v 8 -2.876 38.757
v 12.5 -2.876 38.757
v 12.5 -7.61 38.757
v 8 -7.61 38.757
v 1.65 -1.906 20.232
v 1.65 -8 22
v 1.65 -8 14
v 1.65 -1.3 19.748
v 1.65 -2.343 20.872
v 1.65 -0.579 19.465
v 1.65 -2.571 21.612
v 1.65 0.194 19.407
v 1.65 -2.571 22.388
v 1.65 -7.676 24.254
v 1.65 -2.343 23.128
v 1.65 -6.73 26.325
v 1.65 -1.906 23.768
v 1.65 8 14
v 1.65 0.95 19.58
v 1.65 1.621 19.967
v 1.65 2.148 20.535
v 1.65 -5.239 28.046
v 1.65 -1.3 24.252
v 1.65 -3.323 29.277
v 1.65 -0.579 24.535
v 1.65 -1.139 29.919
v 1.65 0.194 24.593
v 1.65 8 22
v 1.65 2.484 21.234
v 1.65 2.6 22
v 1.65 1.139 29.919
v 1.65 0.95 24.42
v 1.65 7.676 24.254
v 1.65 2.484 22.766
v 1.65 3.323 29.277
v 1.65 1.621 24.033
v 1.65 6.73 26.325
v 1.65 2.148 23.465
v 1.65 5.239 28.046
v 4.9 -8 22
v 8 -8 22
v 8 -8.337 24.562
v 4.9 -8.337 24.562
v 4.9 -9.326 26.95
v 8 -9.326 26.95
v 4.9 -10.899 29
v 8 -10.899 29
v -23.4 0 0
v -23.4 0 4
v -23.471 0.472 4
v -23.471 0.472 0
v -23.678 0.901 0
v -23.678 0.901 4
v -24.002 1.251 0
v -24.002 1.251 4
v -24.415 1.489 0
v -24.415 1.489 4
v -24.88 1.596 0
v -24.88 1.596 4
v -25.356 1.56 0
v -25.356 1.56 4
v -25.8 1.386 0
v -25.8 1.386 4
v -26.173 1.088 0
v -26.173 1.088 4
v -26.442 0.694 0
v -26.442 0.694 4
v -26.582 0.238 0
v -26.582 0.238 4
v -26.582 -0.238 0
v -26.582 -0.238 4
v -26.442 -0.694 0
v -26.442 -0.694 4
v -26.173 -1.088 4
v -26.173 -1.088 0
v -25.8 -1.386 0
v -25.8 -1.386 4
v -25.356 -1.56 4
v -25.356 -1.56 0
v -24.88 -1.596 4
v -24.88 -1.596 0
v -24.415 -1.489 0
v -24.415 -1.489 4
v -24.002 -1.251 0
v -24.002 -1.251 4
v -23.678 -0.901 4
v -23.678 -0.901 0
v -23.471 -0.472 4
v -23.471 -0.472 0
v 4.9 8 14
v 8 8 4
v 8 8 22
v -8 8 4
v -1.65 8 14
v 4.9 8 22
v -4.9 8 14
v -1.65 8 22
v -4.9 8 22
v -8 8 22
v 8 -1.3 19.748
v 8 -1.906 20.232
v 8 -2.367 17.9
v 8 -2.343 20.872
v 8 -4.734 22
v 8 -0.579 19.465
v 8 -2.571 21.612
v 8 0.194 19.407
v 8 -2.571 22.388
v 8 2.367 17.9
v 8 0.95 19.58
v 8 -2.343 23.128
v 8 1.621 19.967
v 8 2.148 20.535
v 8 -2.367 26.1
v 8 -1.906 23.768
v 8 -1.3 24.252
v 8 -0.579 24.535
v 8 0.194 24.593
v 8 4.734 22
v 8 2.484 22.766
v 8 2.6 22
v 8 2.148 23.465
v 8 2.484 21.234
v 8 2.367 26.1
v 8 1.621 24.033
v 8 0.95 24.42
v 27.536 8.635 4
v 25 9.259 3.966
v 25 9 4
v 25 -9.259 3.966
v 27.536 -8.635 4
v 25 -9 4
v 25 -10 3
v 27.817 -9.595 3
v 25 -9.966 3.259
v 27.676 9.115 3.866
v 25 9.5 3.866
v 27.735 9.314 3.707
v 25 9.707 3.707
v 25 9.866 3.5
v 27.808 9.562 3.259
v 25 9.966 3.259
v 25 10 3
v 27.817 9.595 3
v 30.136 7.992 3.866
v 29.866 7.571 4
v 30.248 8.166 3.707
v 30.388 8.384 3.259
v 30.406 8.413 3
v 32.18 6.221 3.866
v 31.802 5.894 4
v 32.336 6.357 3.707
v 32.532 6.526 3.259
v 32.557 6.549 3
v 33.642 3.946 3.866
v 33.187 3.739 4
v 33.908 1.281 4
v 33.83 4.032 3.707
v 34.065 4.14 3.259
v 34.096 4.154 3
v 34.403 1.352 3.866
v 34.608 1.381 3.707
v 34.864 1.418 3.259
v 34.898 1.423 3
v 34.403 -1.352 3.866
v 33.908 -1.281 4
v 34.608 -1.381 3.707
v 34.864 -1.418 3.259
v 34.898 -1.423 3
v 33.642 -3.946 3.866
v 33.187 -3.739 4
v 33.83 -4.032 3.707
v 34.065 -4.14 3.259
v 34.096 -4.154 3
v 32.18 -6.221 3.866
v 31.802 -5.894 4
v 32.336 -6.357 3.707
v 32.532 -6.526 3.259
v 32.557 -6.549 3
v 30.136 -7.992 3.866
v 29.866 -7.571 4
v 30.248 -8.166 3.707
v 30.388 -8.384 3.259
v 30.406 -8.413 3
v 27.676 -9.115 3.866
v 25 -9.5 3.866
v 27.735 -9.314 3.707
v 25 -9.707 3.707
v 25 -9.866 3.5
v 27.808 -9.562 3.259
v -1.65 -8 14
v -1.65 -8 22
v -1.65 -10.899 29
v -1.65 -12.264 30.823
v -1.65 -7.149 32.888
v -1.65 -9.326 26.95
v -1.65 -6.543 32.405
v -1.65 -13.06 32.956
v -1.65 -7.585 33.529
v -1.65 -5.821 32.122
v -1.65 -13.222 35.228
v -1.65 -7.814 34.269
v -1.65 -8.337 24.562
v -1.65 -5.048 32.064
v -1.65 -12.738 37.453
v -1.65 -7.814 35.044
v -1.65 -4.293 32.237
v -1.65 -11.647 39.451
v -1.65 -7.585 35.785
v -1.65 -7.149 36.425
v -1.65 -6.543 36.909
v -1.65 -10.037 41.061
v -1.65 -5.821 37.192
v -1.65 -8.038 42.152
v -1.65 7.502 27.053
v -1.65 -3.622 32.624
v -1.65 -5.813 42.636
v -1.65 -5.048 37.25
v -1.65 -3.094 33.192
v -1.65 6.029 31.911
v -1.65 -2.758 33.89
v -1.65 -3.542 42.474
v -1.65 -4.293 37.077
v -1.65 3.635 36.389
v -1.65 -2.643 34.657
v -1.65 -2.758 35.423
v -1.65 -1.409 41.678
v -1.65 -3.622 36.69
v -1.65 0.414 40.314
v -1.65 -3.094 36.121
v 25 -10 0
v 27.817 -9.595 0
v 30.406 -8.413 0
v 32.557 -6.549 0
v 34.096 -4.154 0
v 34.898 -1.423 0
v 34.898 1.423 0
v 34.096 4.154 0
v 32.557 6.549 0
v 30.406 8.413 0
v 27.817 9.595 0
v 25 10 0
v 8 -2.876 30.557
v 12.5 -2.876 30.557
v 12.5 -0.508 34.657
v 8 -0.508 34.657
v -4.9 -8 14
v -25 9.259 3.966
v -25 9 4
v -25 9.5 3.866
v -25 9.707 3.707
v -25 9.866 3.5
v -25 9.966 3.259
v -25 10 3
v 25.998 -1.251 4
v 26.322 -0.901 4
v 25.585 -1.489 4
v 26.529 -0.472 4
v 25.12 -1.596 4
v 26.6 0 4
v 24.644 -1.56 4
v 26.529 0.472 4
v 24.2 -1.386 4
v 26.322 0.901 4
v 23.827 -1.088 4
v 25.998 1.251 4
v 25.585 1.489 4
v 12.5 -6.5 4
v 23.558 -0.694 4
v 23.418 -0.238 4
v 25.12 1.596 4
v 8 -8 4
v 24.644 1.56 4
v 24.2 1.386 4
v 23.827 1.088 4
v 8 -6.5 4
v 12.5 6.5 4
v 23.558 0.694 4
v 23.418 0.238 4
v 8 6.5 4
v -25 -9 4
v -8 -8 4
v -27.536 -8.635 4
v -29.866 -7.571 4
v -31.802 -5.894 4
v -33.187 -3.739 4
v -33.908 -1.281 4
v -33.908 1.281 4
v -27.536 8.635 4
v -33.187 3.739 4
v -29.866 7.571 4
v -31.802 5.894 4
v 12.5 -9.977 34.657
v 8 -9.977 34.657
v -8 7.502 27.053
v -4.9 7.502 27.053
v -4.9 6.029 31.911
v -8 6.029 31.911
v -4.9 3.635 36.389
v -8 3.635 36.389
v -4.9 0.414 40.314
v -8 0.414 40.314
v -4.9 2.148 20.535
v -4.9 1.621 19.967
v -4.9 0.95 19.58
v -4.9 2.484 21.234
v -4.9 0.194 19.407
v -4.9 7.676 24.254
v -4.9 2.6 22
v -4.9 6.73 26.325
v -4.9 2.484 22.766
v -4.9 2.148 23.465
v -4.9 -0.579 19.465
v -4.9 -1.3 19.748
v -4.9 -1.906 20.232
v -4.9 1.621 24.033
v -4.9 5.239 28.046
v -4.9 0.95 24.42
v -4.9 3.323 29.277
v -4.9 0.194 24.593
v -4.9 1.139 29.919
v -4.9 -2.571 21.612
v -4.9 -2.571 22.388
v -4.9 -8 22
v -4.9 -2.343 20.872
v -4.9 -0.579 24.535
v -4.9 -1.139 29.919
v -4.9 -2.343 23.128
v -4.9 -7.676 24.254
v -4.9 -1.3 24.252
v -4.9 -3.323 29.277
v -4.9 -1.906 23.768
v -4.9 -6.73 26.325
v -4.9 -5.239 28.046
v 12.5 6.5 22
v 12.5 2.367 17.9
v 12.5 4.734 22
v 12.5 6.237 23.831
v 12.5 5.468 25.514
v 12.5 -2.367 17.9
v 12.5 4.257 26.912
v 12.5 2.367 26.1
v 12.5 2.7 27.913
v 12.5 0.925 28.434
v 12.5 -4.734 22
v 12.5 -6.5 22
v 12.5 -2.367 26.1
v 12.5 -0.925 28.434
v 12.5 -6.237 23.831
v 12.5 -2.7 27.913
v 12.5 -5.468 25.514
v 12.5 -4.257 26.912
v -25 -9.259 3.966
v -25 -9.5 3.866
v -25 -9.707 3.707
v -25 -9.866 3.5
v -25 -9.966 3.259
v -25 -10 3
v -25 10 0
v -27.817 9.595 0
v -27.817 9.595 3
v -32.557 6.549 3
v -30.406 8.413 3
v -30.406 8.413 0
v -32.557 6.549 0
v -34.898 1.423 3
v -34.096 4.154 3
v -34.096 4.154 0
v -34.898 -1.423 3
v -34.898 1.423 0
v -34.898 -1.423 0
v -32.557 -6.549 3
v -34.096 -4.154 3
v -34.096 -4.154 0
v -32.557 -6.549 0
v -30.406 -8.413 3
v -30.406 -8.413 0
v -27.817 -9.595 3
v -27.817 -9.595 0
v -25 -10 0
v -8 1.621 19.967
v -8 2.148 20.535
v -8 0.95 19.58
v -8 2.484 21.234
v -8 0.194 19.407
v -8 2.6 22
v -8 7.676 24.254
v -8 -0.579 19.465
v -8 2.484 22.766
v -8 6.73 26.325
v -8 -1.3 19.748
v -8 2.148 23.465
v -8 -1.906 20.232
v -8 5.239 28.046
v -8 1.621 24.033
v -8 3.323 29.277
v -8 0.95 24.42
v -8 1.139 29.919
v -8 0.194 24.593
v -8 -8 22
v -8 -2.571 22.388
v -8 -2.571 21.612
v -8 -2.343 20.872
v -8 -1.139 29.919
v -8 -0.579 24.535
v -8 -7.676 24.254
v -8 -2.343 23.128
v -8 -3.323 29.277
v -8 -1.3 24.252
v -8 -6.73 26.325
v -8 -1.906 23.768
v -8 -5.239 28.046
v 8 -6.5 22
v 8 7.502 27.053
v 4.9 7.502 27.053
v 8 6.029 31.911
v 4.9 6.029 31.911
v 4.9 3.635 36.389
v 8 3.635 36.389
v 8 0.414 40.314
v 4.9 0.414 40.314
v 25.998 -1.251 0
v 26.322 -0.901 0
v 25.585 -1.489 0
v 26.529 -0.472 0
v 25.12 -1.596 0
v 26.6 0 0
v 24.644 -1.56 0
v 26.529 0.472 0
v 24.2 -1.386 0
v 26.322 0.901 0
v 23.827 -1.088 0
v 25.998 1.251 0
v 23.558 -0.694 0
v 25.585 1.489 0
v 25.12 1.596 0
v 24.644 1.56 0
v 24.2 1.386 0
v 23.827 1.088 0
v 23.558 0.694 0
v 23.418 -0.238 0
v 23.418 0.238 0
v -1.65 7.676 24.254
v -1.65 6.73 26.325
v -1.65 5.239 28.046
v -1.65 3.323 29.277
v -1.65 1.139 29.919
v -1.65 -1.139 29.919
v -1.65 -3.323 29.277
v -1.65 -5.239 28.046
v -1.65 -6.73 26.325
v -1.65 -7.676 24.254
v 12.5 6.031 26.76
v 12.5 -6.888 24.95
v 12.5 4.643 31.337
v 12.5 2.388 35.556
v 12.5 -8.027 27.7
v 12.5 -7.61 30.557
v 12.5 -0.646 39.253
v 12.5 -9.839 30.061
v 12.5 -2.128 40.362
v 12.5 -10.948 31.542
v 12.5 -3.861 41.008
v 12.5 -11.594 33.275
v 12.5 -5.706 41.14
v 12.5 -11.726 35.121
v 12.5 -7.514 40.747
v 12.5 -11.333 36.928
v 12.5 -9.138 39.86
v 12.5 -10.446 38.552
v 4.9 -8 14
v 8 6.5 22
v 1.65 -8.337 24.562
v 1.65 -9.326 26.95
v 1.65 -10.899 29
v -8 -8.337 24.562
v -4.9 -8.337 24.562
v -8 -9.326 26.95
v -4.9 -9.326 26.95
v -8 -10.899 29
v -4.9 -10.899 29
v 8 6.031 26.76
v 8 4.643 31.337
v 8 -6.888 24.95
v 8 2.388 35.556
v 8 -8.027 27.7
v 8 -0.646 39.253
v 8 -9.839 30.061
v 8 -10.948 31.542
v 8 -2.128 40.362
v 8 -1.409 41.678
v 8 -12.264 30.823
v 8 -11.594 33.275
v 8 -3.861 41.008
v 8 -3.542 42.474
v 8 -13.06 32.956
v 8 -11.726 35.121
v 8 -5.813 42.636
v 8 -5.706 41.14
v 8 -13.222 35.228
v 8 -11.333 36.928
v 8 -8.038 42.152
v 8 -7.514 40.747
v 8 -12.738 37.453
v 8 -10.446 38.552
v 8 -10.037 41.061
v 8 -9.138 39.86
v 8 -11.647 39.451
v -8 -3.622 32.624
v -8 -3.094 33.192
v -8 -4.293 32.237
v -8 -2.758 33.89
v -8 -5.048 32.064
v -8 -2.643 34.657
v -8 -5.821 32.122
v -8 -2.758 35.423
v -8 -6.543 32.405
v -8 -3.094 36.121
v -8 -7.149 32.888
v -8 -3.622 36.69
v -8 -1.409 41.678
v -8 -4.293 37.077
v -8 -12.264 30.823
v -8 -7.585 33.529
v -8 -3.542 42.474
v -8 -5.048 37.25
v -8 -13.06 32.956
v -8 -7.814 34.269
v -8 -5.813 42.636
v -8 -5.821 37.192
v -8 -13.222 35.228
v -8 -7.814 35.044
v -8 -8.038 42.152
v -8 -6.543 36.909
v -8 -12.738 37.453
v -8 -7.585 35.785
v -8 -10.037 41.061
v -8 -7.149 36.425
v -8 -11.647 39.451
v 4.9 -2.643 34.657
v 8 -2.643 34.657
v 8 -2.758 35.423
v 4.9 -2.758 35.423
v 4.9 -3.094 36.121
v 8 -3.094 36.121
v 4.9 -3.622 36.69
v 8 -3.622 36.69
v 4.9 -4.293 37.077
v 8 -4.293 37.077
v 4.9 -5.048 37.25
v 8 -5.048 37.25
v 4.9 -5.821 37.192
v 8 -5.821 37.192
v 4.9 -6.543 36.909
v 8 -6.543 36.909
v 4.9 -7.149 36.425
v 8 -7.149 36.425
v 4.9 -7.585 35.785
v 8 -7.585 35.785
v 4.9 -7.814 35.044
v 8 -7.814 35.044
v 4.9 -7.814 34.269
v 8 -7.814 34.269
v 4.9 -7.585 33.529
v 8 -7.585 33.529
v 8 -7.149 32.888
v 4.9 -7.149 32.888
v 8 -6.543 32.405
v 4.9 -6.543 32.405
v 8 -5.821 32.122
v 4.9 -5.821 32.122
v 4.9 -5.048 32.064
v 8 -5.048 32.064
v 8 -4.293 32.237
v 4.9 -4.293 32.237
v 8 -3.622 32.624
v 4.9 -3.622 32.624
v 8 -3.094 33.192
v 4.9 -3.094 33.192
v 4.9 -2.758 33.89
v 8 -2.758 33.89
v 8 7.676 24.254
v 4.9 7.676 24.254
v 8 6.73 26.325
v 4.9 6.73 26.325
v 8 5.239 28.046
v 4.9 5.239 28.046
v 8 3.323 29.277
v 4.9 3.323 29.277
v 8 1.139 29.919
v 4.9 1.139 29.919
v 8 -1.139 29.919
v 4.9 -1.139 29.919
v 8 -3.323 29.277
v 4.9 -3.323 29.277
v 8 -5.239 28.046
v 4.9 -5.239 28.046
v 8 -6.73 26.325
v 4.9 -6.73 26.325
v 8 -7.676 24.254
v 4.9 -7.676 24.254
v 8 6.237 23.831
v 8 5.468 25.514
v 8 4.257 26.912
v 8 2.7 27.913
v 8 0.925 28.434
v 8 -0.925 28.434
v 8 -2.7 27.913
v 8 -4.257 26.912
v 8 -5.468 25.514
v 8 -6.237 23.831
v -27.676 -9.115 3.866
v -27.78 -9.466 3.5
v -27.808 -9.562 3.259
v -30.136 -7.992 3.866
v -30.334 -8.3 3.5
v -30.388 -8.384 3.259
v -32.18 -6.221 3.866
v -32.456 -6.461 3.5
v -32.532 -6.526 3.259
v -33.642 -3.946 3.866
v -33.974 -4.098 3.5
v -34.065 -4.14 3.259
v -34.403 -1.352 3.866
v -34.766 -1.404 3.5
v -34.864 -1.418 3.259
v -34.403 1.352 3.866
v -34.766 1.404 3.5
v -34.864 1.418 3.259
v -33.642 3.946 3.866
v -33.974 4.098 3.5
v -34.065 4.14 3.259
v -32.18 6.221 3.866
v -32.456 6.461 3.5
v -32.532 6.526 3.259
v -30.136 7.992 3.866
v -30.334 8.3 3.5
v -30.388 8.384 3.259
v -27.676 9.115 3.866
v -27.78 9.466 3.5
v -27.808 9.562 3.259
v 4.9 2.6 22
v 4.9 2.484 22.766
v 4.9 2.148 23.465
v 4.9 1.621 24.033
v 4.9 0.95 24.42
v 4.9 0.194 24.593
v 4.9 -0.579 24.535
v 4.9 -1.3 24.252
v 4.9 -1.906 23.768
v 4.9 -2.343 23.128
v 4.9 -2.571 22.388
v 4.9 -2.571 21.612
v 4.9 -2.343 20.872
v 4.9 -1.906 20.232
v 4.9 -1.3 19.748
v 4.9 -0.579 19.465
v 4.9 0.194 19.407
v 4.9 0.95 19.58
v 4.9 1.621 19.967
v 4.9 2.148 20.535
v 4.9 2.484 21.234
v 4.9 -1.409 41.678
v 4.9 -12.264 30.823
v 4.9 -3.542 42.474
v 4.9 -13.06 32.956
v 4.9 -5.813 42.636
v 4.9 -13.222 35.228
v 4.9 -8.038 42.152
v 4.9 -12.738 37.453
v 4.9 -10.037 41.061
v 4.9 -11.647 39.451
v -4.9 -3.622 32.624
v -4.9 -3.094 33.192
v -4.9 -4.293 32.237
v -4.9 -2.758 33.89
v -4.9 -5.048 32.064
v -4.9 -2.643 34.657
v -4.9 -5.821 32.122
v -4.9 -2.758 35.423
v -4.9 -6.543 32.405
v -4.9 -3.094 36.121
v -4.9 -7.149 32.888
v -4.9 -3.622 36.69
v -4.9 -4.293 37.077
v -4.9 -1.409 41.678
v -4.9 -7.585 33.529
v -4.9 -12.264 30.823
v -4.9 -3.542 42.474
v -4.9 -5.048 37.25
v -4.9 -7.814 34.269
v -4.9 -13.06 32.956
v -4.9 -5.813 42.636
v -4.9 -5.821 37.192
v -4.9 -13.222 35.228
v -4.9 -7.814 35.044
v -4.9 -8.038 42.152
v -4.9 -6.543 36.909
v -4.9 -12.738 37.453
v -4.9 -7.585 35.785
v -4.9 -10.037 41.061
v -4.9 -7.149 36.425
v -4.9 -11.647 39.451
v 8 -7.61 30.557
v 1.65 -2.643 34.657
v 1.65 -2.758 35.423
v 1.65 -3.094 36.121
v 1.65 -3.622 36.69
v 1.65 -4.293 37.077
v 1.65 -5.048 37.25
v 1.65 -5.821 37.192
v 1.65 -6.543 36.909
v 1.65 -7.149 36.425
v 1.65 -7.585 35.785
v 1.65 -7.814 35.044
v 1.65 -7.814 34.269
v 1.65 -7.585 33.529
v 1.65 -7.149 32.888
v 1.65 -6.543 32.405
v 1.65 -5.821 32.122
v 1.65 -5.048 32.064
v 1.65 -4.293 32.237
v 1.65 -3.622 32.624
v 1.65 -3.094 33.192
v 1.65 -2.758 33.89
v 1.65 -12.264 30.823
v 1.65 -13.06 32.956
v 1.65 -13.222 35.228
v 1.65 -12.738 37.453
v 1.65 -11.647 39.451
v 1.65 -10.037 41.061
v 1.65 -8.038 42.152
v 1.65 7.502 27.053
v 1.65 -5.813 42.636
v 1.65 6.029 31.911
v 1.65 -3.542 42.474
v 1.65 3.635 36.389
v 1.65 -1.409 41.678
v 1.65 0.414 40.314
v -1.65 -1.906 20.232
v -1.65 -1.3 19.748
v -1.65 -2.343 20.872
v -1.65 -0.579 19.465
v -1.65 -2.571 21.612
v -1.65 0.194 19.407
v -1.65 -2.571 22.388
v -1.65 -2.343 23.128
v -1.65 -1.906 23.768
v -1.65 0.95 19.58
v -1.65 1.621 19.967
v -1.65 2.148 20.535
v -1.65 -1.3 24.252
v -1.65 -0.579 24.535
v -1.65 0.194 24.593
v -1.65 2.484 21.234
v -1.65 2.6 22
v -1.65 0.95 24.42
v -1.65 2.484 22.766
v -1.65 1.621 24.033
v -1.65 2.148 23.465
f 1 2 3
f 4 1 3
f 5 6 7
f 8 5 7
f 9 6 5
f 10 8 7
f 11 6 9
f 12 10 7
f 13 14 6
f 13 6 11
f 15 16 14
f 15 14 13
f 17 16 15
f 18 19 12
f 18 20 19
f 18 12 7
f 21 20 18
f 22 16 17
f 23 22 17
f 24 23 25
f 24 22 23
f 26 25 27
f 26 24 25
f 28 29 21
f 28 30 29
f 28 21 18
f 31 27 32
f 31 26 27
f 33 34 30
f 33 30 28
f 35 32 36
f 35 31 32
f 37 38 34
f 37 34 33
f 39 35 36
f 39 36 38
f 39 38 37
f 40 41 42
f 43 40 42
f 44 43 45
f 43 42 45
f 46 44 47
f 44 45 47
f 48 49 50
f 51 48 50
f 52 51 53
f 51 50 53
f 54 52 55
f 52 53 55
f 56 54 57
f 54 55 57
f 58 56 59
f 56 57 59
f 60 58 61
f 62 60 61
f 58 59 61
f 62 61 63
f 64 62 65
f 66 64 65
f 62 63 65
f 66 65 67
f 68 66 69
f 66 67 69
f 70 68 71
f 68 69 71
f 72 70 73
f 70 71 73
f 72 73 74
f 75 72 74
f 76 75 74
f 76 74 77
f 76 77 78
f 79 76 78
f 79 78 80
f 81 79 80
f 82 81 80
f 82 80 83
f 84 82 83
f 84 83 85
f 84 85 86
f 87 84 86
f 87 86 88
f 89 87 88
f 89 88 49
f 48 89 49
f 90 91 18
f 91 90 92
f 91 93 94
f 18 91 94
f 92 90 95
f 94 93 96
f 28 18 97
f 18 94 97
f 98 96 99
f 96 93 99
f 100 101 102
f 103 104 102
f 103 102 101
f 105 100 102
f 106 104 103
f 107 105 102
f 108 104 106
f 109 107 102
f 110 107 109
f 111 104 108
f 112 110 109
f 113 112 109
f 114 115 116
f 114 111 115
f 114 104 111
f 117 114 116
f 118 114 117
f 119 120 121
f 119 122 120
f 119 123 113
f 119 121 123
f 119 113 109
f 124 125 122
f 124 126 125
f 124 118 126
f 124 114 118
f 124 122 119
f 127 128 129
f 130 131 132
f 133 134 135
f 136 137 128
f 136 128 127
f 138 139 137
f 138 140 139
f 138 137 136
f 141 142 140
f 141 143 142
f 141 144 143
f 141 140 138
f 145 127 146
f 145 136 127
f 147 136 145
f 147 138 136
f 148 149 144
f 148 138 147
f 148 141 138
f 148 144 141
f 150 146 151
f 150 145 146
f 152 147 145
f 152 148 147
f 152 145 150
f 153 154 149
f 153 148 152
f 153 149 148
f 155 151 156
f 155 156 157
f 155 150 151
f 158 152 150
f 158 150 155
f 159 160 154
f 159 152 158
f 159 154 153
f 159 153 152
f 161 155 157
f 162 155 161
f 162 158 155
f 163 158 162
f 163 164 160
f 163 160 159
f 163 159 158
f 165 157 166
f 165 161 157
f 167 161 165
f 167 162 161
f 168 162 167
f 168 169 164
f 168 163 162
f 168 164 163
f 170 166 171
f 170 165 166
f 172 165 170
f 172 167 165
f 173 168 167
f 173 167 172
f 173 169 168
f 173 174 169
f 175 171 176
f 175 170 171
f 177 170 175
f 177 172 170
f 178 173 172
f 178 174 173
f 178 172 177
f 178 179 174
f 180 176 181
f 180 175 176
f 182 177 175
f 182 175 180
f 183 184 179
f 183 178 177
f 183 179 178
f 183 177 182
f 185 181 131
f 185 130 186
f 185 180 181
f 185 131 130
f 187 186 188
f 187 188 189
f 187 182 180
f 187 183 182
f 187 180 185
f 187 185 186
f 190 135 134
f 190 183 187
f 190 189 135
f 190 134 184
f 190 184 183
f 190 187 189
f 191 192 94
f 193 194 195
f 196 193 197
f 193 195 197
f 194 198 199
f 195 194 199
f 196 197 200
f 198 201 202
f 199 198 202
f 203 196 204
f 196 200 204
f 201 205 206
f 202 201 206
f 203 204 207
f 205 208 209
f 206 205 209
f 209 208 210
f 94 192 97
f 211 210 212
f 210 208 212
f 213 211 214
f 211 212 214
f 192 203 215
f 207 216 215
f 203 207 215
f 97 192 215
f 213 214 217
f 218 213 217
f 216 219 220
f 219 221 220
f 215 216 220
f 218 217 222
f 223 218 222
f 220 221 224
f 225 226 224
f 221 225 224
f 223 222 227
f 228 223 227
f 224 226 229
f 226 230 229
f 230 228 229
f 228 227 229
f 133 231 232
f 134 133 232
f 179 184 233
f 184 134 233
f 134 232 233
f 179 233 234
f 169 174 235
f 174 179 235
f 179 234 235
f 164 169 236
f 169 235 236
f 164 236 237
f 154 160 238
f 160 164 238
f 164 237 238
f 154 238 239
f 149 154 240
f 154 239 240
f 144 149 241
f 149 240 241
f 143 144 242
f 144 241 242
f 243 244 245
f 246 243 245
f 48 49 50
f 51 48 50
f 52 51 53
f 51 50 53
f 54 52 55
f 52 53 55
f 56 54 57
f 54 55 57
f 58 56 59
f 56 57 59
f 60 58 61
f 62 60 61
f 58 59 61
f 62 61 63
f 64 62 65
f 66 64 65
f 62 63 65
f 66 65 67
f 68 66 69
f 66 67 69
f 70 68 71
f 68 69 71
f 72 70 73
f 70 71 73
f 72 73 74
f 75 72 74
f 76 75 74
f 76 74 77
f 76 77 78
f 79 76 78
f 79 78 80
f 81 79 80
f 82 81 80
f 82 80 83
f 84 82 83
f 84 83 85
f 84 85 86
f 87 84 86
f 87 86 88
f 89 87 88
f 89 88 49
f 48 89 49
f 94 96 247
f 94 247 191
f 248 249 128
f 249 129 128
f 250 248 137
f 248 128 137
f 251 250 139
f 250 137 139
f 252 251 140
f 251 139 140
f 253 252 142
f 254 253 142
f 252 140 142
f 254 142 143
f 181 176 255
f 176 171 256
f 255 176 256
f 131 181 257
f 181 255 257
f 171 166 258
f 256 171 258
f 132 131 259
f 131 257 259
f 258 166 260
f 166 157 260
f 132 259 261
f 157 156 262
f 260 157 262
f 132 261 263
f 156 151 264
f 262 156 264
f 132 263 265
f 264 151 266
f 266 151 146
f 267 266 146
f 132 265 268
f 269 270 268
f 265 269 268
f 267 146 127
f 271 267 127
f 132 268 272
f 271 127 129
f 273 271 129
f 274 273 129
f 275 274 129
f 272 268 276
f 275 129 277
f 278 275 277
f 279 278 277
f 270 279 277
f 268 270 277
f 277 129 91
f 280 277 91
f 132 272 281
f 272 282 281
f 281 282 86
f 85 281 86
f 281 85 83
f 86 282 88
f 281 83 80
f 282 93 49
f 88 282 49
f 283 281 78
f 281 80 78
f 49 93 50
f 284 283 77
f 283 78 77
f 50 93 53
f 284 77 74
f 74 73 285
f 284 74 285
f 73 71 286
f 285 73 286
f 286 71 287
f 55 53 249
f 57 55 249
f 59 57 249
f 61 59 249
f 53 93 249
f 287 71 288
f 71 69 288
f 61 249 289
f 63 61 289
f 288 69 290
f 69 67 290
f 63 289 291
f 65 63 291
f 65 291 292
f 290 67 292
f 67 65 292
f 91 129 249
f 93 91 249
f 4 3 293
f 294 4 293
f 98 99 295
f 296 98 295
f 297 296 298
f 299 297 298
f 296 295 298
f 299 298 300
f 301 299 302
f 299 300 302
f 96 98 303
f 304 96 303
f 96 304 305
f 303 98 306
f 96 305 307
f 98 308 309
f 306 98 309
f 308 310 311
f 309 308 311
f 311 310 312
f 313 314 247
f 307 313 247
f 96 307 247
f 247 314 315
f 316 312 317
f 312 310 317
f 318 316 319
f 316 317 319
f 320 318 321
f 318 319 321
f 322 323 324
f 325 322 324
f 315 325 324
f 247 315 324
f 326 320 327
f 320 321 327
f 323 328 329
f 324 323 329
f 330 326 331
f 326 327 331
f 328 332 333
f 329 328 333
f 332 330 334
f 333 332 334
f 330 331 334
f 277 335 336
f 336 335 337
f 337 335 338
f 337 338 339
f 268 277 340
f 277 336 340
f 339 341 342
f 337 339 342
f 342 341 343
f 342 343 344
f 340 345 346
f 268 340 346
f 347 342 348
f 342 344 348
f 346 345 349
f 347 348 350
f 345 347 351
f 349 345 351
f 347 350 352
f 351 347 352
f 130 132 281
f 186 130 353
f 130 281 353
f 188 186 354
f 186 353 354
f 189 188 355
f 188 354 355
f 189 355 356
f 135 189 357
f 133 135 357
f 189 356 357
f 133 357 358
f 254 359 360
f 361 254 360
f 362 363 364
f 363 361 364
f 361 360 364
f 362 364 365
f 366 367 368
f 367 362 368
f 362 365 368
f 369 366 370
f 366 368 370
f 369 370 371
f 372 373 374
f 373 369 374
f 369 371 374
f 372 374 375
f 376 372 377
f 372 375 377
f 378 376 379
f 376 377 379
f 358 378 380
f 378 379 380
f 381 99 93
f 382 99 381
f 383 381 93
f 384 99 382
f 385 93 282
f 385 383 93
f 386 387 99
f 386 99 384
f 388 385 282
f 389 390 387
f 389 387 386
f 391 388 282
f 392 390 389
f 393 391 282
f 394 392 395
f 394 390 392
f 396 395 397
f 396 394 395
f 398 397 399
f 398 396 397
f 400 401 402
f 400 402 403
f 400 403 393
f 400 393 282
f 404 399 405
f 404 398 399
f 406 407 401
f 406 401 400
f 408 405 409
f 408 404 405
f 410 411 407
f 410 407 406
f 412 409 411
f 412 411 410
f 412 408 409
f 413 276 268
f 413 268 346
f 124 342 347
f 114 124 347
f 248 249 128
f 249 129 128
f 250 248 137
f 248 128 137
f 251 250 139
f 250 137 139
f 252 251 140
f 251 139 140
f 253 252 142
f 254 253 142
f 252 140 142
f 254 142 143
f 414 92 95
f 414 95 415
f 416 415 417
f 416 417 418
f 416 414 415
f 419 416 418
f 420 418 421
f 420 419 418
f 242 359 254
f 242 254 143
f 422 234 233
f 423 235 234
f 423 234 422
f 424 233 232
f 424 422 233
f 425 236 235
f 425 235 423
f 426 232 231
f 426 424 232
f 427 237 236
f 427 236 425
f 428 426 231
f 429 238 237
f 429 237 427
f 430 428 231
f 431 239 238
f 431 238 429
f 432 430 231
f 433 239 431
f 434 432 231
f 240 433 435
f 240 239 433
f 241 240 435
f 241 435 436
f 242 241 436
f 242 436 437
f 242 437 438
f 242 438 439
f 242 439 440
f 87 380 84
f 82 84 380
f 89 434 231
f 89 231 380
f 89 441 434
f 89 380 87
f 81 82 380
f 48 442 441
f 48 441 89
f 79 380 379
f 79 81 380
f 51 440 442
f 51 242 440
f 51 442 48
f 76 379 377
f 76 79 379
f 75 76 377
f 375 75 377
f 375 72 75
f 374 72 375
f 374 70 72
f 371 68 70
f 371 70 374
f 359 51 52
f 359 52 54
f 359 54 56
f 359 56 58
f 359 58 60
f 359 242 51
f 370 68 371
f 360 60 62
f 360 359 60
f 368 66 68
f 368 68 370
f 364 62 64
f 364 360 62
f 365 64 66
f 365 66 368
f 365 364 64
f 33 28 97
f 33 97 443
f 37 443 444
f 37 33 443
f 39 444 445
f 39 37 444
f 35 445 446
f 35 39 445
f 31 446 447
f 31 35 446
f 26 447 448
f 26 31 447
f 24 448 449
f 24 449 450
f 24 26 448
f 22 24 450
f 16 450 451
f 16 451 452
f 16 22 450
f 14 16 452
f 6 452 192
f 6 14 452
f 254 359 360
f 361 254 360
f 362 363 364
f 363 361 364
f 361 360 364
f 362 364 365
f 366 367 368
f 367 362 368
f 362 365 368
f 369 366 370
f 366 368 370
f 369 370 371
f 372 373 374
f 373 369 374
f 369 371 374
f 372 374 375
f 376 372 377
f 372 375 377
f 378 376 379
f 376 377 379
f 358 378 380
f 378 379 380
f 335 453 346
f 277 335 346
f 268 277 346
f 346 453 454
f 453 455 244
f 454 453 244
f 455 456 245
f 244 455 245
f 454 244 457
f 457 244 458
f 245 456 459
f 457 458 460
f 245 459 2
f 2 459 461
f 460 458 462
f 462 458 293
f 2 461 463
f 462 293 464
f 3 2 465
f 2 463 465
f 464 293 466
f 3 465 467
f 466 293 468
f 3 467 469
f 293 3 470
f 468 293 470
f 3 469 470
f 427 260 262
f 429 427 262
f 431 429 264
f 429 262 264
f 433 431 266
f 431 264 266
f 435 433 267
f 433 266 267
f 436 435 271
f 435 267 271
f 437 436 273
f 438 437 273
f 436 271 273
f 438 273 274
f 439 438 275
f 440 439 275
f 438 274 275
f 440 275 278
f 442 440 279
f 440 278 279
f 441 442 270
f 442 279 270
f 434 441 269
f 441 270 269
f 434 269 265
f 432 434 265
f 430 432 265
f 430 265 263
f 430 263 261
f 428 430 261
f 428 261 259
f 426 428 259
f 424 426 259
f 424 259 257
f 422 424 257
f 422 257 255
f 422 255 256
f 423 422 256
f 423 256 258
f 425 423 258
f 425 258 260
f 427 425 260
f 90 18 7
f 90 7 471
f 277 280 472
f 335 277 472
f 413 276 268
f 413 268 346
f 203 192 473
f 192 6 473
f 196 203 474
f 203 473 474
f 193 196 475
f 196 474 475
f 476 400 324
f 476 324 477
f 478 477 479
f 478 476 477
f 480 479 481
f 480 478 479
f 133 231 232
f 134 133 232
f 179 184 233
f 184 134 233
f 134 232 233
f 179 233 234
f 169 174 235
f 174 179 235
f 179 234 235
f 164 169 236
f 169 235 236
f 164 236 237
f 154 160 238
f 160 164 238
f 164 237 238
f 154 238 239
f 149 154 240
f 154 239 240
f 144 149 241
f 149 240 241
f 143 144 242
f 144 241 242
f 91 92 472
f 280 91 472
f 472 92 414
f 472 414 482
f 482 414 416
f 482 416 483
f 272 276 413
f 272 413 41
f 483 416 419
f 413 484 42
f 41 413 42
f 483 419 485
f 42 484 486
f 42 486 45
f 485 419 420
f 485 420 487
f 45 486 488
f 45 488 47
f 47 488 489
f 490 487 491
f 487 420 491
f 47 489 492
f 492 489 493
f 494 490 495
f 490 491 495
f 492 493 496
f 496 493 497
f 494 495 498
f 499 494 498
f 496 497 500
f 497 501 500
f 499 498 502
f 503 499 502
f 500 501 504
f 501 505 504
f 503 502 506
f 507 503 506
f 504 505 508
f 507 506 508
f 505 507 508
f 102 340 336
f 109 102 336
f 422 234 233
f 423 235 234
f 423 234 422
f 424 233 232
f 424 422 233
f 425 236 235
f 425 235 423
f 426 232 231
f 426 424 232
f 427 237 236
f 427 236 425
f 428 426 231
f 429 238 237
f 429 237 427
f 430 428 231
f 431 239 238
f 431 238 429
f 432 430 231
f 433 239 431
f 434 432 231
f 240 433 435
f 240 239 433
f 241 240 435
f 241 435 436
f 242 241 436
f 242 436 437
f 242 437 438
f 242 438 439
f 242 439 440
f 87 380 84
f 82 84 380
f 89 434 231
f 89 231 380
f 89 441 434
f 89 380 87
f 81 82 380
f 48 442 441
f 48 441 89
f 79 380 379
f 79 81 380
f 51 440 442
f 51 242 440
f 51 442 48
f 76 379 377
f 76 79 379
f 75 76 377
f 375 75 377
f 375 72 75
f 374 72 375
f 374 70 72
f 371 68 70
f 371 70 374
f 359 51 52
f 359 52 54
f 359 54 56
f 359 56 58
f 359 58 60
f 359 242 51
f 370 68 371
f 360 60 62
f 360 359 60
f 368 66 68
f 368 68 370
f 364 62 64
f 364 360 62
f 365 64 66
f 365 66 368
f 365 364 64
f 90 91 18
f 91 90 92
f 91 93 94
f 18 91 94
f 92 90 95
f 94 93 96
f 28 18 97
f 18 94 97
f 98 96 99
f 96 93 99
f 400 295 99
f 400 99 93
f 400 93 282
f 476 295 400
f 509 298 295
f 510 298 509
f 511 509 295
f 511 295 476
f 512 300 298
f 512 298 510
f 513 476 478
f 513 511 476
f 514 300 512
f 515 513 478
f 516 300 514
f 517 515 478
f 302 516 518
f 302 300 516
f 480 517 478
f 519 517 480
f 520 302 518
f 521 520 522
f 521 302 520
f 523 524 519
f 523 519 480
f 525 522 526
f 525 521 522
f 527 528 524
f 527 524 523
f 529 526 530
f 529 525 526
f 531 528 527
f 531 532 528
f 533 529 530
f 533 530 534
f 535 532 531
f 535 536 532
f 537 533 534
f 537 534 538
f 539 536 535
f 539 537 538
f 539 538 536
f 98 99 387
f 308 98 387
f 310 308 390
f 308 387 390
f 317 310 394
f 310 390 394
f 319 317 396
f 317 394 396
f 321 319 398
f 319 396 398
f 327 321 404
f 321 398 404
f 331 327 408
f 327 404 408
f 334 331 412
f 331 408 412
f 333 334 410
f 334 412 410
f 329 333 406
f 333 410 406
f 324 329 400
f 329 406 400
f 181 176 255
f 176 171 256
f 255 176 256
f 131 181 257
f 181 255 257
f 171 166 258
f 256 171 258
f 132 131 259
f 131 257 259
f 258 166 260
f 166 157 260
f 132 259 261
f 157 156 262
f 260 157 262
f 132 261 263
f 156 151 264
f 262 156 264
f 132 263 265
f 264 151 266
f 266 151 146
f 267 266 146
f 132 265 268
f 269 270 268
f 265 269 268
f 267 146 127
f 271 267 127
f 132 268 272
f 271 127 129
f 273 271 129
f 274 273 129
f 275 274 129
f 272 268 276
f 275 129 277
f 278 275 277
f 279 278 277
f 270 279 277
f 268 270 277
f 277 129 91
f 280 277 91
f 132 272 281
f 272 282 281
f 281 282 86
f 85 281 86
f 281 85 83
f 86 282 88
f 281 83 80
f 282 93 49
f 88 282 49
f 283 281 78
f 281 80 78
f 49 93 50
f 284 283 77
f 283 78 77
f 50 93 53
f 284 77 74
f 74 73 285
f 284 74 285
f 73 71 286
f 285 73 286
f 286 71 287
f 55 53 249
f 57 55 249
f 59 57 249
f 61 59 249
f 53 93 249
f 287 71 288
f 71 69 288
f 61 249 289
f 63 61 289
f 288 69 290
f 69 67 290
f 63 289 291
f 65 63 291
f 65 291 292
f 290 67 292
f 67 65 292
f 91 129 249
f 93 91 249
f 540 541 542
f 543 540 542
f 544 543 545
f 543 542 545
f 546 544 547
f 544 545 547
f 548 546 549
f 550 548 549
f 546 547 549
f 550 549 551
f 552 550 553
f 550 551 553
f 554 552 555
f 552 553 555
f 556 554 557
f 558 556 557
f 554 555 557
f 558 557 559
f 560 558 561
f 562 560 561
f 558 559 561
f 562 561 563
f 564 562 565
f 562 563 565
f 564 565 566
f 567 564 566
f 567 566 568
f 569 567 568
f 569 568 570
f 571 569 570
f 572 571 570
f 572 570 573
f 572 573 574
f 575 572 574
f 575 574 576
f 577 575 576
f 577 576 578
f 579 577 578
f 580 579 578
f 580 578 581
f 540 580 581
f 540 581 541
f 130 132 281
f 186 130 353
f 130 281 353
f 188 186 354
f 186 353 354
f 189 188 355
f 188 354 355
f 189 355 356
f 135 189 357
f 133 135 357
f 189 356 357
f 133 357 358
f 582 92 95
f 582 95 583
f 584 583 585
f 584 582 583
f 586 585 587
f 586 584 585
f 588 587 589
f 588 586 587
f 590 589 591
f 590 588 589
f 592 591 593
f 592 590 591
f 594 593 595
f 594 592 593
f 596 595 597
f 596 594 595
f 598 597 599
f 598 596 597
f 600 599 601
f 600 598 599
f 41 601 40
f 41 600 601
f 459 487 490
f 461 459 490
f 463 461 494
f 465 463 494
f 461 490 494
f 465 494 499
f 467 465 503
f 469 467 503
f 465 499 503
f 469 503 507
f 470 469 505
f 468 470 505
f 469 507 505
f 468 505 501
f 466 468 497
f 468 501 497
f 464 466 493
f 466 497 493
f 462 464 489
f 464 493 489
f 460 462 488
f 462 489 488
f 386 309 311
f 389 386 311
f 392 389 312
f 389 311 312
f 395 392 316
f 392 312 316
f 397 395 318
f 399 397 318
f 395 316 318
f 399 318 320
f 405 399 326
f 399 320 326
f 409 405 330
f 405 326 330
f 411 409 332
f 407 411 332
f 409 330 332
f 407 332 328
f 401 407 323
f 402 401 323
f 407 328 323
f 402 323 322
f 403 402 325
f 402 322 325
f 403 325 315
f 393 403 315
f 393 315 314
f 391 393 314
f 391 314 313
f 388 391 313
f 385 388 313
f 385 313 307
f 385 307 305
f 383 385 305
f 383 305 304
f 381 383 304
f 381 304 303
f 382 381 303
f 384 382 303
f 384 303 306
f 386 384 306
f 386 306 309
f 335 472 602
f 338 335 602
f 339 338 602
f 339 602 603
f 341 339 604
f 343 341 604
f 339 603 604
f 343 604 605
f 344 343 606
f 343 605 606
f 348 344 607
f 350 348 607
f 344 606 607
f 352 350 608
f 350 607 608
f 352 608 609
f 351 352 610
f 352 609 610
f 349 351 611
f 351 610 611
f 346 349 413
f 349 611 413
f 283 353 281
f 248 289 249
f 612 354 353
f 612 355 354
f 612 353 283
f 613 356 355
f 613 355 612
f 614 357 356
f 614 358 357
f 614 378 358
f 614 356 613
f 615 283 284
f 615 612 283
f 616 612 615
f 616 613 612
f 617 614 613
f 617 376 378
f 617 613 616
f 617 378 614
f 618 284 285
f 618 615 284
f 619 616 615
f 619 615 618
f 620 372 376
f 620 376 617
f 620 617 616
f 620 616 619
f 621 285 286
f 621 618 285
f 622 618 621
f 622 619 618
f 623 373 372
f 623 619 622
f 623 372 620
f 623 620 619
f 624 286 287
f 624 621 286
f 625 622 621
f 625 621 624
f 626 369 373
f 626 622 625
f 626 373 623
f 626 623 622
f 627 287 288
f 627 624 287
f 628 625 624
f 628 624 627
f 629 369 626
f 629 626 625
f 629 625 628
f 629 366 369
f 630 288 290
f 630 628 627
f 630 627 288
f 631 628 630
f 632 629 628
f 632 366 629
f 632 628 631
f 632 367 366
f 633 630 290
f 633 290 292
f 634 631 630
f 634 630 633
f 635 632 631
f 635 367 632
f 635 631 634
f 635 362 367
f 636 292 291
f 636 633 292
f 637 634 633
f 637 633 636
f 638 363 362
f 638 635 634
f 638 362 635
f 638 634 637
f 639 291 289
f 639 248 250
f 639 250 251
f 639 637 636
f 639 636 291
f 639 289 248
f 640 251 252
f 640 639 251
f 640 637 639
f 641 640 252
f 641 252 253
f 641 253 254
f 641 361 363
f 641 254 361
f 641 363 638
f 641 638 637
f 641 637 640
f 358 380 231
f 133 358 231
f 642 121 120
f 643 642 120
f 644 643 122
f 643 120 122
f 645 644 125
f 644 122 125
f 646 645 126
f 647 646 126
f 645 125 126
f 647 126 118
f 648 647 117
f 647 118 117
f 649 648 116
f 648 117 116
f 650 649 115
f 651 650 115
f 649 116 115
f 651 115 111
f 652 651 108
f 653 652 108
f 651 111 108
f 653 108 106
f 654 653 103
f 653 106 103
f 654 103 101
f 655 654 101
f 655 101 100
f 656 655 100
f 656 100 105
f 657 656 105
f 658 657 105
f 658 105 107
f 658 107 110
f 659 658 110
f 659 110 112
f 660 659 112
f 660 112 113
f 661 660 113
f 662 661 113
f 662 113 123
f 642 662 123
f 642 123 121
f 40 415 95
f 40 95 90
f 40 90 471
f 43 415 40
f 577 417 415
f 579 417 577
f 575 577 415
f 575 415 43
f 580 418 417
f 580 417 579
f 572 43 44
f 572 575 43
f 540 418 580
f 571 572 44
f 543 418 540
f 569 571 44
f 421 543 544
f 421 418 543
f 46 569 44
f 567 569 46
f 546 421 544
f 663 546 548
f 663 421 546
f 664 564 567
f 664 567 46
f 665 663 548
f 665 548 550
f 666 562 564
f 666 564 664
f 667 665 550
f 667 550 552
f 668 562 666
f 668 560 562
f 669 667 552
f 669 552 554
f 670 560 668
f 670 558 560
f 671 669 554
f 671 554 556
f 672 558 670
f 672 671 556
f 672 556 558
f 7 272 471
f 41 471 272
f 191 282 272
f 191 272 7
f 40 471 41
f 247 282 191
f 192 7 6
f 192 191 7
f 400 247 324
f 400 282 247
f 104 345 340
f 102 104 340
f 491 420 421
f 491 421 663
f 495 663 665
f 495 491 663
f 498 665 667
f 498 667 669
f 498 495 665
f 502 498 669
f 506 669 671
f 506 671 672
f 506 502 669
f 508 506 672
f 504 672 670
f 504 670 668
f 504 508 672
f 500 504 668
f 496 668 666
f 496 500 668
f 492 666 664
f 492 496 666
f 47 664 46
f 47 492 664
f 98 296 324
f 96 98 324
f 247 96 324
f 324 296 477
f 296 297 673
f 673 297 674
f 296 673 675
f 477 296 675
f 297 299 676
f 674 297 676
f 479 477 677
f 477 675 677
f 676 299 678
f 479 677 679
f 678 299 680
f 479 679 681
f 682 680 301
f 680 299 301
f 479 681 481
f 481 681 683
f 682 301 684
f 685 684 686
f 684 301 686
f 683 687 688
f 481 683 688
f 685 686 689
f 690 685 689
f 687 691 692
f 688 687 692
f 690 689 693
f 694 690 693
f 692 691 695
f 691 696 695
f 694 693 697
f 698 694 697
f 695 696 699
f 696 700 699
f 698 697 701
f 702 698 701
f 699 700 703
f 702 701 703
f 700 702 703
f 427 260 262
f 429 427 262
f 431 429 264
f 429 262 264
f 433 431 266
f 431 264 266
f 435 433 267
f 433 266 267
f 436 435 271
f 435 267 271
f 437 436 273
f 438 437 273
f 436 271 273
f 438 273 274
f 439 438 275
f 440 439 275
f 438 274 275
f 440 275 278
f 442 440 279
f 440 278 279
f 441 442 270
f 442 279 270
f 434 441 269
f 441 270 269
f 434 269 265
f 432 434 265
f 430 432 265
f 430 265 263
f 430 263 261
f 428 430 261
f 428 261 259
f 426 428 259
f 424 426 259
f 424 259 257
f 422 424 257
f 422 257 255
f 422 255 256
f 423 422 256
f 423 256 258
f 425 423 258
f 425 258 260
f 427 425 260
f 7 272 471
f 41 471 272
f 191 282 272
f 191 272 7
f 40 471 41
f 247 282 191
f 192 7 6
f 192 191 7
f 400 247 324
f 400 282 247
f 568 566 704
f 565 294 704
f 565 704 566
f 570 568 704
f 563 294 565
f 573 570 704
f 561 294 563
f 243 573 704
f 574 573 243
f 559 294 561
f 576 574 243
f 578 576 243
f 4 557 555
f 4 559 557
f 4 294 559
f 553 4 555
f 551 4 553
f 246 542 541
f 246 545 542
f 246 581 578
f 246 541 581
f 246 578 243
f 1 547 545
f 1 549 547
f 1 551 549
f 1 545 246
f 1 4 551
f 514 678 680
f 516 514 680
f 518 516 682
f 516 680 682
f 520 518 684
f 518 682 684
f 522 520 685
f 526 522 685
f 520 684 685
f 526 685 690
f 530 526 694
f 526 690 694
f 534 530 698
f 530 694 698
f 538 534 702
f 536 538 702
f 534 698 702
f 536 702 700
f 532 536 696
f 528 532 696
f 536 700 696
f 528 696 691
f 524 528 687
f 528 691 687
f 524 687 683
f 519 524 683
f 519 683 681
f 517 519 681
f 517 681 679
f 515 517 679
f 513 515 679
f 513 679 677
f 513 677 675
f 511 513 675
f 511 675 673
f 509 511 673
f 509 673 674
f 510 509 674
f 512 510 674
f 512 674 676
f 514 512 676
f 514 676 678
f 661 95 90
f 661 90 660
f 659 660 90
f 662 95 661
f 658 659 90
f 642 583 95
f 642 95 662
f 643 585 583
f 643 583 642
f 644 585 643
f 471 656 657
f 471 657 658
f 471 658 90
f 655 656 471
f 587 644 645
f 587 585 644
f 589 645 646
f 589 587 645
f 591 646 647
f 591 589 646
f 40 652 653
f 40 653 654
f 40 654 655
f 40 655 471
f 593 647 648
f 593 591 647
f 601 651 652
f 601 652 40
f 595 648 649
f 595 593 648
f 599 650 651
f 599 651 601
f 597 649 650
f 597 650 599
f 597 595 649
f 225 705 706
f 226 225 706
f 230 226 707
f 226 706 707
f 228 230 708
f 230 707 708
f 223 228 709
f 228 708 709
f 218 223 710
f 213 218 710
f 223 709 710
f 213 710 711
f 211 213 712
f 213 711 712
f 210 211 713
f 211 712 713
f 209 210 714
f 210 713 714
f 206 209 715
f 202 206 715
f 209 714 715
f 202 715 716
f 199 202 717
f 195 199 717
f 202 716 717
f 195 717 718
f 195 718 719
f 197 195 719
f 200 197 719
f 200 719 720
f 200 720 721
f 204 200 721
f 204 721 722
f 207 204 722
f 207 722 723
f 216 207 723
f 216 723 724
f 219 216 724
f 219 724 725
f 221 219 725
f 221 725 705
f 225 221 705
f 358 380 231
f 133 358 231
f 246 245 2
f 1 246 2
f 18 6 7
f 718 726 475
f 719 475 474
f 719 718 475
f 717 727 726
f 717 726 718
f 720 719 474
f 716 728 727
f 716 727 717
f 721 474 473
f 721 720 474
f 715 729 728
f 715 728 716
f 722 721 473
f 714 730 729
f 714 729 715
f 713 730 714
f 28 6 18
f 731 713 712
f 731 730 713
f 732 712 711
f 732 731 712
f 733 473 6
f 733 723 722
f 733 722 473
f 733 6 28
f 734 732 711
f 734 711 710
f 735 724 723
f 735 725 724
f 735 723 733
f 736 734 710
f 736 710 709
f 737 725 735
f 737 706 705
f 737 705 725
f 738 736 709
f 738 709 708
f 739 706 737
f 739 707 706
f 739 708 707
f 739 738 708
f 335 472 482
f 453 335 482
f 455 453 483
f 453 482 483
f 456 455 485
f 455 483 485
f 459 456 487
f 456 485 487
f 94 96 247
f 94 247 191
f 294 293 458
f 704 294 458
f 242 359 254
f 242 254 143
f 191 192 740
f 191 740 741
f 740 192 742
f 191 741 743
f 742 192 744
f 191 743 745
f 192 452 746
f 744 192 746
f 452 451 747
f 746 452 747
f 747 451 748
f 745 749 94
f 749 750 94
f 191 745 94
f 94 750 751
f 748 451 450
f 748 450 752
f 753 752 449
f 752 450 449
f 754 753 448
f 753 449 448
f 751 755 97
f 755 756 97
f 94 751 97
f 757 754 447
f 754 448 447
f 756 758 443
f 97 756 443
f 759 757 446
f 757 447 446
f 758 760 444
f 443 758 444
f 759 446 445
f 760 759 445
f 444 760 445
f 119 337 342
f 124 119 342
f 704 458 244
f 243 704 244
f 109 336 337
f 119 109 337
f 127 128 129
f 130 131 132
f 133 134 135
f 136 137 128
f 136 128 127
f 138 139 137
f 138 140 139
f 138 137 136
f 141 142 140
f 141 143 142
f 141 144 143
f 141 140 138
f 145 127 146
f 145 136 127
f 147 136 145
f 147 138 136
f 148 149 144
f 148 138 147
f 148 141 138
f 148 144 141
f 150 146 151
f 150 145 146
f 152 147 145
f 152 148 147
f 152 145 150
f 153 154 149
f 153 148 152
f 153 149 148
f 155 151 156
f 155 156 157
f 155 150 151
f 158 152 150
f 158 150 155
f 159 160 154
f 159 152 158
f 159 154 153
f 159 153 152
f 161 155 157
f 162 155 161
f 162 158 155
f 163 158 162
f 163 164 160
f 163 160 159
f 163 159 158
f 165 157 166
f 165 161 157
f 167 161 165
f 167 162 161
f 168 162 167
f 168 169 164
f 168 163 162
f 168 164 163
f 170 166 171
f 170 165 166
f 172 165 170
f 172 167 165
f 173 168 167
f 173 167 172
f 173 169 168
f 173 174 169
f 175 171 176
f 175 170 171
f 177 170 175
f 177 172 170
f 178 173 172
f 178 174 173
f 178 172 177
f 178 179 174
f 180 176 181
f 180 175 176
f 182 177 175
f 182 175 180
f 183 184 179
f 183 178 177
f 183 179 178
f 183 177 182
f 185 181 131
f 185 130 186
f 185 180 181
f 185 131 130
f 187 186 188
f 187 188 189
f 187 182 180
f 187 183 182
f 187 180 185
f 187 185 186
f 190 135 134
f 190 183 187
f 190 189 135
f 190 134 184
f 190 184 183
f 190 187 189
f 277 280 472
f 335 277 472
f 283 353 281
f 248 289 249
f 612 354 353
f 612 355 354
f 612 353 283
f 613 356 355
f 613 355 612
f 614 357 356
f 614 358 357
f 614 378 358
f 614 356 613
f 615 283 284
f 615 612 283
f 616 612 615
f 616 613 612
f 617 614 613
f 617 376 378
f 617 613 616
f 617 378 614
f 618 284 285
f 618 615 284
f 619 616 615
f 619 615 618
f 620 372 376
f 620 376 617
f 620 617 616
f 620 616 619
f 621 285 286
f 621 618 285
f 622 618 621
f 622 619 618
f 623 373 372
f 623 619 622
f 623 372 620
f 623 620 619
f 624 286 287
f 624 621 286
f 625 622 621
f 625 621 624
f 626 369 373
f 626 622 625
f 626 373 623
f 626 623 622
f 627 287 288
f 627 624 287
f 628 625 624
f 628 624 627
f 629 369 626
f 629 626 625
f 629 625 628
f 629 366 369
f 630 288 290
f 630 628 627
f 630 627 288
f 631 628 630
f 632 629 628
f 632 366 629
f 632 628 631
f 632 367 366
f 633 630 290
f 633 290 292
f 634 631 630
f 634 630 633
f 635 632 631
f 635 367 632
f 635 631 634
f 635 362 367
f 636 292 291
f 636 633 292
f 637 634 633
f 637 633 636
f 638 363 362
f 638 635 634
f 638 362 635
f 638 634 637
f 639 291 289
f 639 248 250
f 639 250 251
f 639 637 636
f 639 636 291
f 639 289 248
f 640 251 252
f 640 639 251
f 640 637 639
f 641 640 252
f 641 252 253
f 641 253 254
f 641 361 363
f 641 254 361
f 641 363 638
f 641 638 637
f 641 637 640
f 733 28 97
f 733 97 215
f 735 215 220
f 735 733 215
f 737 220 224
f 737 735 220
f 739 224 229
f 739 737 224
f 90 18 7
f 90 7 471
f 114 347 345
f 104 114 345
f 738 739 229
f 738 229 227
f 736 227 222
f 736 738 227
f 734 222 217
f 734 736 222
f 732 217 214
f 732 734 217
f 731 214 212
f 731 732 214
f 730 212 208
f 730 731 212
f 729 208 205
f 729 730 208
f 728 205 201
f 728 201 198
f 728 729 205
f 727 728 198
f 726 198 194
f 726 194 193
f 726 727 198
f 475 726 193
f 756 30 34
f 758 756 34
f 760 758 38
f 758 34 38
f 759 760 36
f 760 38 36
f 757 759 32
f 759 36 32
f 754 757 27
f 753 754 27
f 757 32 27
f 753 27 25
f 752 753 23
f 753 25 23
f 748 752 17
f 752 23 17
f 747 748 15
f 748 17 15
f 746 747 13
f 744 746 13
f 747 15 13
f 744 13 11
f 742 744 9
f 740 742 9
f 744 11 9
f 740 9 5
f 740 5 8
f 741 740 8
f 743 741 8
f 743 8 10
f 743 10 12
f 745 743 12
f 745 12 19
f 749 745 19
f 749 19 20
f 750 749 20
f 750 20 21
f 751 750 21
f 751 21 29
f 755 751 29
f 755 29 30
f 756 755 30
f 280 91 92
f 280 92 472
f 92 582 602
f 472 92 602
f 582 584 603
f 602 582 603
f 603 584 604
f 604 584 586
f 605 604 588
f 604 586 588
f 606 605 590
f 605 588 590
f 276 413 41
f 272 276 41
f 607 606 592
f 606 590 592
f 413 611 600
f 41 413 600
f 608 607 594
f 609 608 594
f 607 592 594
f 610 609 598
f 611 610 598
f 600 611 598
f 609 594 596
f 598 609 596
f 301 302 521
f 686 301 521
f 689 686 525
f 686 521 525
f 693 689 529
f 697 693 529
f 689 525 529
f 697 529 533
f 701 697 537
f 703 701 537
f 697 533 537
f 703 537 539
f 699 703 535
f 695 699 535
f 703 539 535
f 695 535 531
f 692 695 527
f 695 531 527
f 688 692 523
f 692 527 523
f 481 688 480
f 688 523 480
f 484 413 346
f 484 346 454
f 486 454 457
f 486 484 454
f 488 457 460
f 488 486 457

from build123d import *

# Parameters (mm, degrees)
PAD_DEPTH       = 4
SKETCH001_R     = 1.6
POCKET_DEPTH    = 4.001
SKETCH002_W     = 16
SKETCH002_H     = 16
PAD001_DEPTH    = 10
PAD002_DEPTH    = 3.1
PAD003_DEPTH    = 1.65
SKETCH005_R     = 2.6
POCKET001_DEPTH = 43.001
PAD004_DEPTH    = 4.5
POCKET002_DEPTH = 4.5
FILLET_R        = 1
PAD009_DEPTH    = 4
SKETCH013_R     = 1.6
POCKET004_DEPTH = 4.001
SKETCH014_W     = 16
SKETCH014_H     = 16
PAD008_DEPTH    = 10
PAD007_DEPTH    = 3.1
PAD005_DEPTH    = 1.65
SKETCH010_R     = 2.6
POCKET003_DEPTH = 43.001
PAD006_DEPTH    = 4.5
POCKET005_DEPTH = 4.5
FILLET001_R     = 1


with BuildPart() as straighttwoscrews:
    # Sketch → Pad (new body)
    with BuildSketch(Plane.XY):
        with BuildLine():
            Line((-25, 10), (25, 10))
            ThreePointArc((25, -10), (35, 0), (25, 10))
            Line((-25, -10), (25, -10))
            ThreePointArc((-25, 10), (-35, 0), (-25, -10))
        make_face()
    extrude(amount=PAD_DEPTH)

    # Sketch001 (on Face6 of Pad) → Pocket (cut, through all)
    with BuildSketch(Plane.XY.offset(4)):
        with Locations((-25, 0)):
            Circle(SKETCH001_R)
        with Locations((25, 0)):
            Circle(SKETCH001_R)
    extrude(amount=-POCKET_DEPTH, mode=Mode.SUBTRACT)

    # Sketch002 (on Face5 of Pocket) → Pad001 (join)
    with BuildSketch(Plane.XY.offset(4)):
        Rectangle(SKETCH002_W, SKETCH002_H)
    extrude(amount=PAD001_DEPTH)

    # Sketch003 (on Face9 of Pad001) → Pad002 (join)
    with BuildSketch(Plane.YZ.offset(8)):
        with BuildLine():
            Line((-8, 14), (-8, 22))
            ThreePointArc((8, 22), (0, 30), (-8, 22))
            Line((8, 14), (8, 22))
            Line((-8, 14), (8, 14))
        make_face()
    pad002 = extrude(amount=-PAD002_DEPTH)

    # Mirrored: Pad002 across YZ
    add(pad002.mirror(Plane.YZ))

    # Sketch004 → Pad003 (join, symmetric)
    with BuildSketch(Plane.YZ):
        with BuildLine():
            Line((-8, 14), (8, 14))
            Line((8, 14), (8, 22))
            ThreePointArc((8, 22), (0, 30), (-8, 22))
            Line((-8, 14), (-8, 22))
        make_face()
    extrude(amount=PAD003_DEPTH, both=True)

    # Sketch005 (on Face13 of Pad003) → Pocket001 (cut, through all)
    with BuildSketch(Plane.YZ.offset(8)):
        with Locations((0, 22)):
            Circle(SKETCH005_R)
    extrude(amount=-POCKET001_DEPTH, mode=Mode.SUBTRACT)

    # Sketch006 (on Face9 of Pocket001) → Pad004 (join)
    with BuildSketch(Plane.YZ.offset(8)):
        with BuildLine():
            Line((-6.5, 4), (-6.5, 22))
            ThreePointArc((6.5, 22), (0, 28.5), (-6.5, 22))
            Line((6.5, 4), (6.5, 22))
            Line((-6.5, 4), (6.5, 4))
        make_face()
    extrude(amount=PAD004_DEPTH)

    # Sketch007 (on Face14 of Pad004) → Pocket002 (cut)
    with BuildSketch(Plane.YZ.offset(12.5)):
        Polygon((2.367136, 26.1), (-2.367136, 26.1), (-4.734272, 22), (-2.367136, 17.9), (2.367136, 17.9), (4.734272, 22), align=None)
    extrude(amount=-POCKET002_DEPTH, mode=Mode.SUBTRACT)

    # Fillet
    fillet_edges = [straighttwoscrews.edges().sort_by_distance(p)[0] for p in [
        (0, 10, 4),
        (35, 0, 4),
        (0, -10, 4),
        (-35, 0, 4),
    ]]
    fillet(fillet_edges, radius=FILLET_R)


with BuildPart() as curvedtwoscrews001:
    # Sketch012 → Pad009 (new body)
    with BuildSketch(Plane.XY):
        with BuildLine():
            Line((-25, 10), (25, 10))
            ThreePointArc((25, -10), (35, 0), (25, 10))
            Line((-25, -10), (25, -10))
            ThreePointArc((-25, 10), (-35, 0), (-25, -10))
        make_face()
    extrude(amount=PAD009_DEPTH)

    # Sketch013 (on Face6 of Pad009) → Pocket004 (cut, through all)
    with BuildSketch(Plane.XY.offset(4)):
        with Locations((-25, 0)):
            Circle(SKETCH013_R)
        with Locations((25, 0)):
            Circle(SKETCH013_R)
    extrude(amount=-POCKET004_DEPTH, mode=Mode.SUBTRACT)

    # Sketch014 (on Face5 of Pocket004) → Pad008 (join)
    with BuildSketch(Plane.XY.offset(4)):
        Rectangle(SKETCH014_W, SKETCH014_H)
    extrude(amount=PAD008_DEPTH)

    # Sketch015 (on Face9 of Pad008) → Pad007 (join)
    with BuildSketch(Plane.YZ.offset(8)):
        with BuildLine():
            Line((-8, 14), (-8, 22))
            ThreePointArc((-8, 22), (-8.753554, 25.788373), (-10.899495, 29))
            ThreePointArc((0.414214, 40.313708), (-10.899495, 40.313708), (-10.899495, 29))
            ThreePointArc((8, 22), (6.028518, 31.911308), (0.414214, 40.313708))
            Line((8, 14), (8, 22))
            Line((-8, 14), (8, 14))
        make_face()
    pad007 = extrude(amount=-PAD007_DEPTH)

    # Mirrored001: Pad007 across YZ
    add(pad007.mirror(Plane.YZ))

    # Sketch011 → Pad005 (join, symmetric)
    with BuildSketch(Plane.YZ):
        with BuildLine():
            Line((-8, 14), (8, 14))
            Line((8, 14), (8, 22))
            ThreePointArc((8, 22), (6.028518, 31.911308), (0.414214, 40.313708))
            ThreePointArc((0.414214, 40.313708), (-10.899495, 40.313708), (-10.899495, 29))
            ThreePointArc((-8, 22), (-8.753554, 25.788373), (-10.899495, 29))
            Line((-8, 14), (-8, 22))
        make_face()
    extrude(amount=PAD005_DEPTH, both=True)

    # Sketch010 (on Face13 of Pad005) → Pocket003 (cut, through all)
    with BuildSketch(Plane.YZ.offset(8)):
        with Locations((-5.242641, 34.656854)):
            Circle(SKETCH010_R)
    extrude(amount=-POCKET003_DEPTH, mode=Mode.SUBTRACT)

    # Sketch009 (on Face9 of Pocket003) → Pad006 (join)
    with BuildSketch(Plane.YZ.offset(8)):
        with BuildLine():
            Line((-6.5, 4), (-6.5, 22))
            ThreePointArc((-6.5, 22), (-7.367735, 26.362398), (-9.838835, 30.06066))
            ThreePointArc((-0.646447, 39.253048), (-9.838835, 39.253048), (-9.838835, 30.06066))
            ThreePointArc((6.5, 22), (4.642699, 31.337282), (-0.646447, 39.253048))
            Line((6.5, 4), (6.5, 22))
            Line((-6.5, 4), (6.5, 4))
        make_face()
    extrude(amount=PAD006_DEPTH)

    # Sketch008 (on Face14 of Pad006) → Pocket005 (cut)
    with BuildSketch(Plane.YZ.offset(12.5)):
        Polygon((-2.875505, 38.756854), (-7.609777, 38.756854), (-9.976913, 34.656854), (-7.609777, 30.556854), (-2.875505, 30.556854), (-0.508368, 34.656854), align=None)
    extrude(amount=-POCKET005_DEPTH, mode=Mode.SUBTRACT)

    # Fillet001
    fillet001_edges = [curvedtwoscrews001.edges().sort_by_distance(p)[0] for p in [
        (0, 10, 4),
        (35, 0, 4),
        (0, -10, 4),
        (-35, 0, 4),
    ]]
    fillet(fillet001_edges, radius=FILLET001_R)


solid = Compound([straighttwoscrews.part, curvedtwoscrews001.part])
